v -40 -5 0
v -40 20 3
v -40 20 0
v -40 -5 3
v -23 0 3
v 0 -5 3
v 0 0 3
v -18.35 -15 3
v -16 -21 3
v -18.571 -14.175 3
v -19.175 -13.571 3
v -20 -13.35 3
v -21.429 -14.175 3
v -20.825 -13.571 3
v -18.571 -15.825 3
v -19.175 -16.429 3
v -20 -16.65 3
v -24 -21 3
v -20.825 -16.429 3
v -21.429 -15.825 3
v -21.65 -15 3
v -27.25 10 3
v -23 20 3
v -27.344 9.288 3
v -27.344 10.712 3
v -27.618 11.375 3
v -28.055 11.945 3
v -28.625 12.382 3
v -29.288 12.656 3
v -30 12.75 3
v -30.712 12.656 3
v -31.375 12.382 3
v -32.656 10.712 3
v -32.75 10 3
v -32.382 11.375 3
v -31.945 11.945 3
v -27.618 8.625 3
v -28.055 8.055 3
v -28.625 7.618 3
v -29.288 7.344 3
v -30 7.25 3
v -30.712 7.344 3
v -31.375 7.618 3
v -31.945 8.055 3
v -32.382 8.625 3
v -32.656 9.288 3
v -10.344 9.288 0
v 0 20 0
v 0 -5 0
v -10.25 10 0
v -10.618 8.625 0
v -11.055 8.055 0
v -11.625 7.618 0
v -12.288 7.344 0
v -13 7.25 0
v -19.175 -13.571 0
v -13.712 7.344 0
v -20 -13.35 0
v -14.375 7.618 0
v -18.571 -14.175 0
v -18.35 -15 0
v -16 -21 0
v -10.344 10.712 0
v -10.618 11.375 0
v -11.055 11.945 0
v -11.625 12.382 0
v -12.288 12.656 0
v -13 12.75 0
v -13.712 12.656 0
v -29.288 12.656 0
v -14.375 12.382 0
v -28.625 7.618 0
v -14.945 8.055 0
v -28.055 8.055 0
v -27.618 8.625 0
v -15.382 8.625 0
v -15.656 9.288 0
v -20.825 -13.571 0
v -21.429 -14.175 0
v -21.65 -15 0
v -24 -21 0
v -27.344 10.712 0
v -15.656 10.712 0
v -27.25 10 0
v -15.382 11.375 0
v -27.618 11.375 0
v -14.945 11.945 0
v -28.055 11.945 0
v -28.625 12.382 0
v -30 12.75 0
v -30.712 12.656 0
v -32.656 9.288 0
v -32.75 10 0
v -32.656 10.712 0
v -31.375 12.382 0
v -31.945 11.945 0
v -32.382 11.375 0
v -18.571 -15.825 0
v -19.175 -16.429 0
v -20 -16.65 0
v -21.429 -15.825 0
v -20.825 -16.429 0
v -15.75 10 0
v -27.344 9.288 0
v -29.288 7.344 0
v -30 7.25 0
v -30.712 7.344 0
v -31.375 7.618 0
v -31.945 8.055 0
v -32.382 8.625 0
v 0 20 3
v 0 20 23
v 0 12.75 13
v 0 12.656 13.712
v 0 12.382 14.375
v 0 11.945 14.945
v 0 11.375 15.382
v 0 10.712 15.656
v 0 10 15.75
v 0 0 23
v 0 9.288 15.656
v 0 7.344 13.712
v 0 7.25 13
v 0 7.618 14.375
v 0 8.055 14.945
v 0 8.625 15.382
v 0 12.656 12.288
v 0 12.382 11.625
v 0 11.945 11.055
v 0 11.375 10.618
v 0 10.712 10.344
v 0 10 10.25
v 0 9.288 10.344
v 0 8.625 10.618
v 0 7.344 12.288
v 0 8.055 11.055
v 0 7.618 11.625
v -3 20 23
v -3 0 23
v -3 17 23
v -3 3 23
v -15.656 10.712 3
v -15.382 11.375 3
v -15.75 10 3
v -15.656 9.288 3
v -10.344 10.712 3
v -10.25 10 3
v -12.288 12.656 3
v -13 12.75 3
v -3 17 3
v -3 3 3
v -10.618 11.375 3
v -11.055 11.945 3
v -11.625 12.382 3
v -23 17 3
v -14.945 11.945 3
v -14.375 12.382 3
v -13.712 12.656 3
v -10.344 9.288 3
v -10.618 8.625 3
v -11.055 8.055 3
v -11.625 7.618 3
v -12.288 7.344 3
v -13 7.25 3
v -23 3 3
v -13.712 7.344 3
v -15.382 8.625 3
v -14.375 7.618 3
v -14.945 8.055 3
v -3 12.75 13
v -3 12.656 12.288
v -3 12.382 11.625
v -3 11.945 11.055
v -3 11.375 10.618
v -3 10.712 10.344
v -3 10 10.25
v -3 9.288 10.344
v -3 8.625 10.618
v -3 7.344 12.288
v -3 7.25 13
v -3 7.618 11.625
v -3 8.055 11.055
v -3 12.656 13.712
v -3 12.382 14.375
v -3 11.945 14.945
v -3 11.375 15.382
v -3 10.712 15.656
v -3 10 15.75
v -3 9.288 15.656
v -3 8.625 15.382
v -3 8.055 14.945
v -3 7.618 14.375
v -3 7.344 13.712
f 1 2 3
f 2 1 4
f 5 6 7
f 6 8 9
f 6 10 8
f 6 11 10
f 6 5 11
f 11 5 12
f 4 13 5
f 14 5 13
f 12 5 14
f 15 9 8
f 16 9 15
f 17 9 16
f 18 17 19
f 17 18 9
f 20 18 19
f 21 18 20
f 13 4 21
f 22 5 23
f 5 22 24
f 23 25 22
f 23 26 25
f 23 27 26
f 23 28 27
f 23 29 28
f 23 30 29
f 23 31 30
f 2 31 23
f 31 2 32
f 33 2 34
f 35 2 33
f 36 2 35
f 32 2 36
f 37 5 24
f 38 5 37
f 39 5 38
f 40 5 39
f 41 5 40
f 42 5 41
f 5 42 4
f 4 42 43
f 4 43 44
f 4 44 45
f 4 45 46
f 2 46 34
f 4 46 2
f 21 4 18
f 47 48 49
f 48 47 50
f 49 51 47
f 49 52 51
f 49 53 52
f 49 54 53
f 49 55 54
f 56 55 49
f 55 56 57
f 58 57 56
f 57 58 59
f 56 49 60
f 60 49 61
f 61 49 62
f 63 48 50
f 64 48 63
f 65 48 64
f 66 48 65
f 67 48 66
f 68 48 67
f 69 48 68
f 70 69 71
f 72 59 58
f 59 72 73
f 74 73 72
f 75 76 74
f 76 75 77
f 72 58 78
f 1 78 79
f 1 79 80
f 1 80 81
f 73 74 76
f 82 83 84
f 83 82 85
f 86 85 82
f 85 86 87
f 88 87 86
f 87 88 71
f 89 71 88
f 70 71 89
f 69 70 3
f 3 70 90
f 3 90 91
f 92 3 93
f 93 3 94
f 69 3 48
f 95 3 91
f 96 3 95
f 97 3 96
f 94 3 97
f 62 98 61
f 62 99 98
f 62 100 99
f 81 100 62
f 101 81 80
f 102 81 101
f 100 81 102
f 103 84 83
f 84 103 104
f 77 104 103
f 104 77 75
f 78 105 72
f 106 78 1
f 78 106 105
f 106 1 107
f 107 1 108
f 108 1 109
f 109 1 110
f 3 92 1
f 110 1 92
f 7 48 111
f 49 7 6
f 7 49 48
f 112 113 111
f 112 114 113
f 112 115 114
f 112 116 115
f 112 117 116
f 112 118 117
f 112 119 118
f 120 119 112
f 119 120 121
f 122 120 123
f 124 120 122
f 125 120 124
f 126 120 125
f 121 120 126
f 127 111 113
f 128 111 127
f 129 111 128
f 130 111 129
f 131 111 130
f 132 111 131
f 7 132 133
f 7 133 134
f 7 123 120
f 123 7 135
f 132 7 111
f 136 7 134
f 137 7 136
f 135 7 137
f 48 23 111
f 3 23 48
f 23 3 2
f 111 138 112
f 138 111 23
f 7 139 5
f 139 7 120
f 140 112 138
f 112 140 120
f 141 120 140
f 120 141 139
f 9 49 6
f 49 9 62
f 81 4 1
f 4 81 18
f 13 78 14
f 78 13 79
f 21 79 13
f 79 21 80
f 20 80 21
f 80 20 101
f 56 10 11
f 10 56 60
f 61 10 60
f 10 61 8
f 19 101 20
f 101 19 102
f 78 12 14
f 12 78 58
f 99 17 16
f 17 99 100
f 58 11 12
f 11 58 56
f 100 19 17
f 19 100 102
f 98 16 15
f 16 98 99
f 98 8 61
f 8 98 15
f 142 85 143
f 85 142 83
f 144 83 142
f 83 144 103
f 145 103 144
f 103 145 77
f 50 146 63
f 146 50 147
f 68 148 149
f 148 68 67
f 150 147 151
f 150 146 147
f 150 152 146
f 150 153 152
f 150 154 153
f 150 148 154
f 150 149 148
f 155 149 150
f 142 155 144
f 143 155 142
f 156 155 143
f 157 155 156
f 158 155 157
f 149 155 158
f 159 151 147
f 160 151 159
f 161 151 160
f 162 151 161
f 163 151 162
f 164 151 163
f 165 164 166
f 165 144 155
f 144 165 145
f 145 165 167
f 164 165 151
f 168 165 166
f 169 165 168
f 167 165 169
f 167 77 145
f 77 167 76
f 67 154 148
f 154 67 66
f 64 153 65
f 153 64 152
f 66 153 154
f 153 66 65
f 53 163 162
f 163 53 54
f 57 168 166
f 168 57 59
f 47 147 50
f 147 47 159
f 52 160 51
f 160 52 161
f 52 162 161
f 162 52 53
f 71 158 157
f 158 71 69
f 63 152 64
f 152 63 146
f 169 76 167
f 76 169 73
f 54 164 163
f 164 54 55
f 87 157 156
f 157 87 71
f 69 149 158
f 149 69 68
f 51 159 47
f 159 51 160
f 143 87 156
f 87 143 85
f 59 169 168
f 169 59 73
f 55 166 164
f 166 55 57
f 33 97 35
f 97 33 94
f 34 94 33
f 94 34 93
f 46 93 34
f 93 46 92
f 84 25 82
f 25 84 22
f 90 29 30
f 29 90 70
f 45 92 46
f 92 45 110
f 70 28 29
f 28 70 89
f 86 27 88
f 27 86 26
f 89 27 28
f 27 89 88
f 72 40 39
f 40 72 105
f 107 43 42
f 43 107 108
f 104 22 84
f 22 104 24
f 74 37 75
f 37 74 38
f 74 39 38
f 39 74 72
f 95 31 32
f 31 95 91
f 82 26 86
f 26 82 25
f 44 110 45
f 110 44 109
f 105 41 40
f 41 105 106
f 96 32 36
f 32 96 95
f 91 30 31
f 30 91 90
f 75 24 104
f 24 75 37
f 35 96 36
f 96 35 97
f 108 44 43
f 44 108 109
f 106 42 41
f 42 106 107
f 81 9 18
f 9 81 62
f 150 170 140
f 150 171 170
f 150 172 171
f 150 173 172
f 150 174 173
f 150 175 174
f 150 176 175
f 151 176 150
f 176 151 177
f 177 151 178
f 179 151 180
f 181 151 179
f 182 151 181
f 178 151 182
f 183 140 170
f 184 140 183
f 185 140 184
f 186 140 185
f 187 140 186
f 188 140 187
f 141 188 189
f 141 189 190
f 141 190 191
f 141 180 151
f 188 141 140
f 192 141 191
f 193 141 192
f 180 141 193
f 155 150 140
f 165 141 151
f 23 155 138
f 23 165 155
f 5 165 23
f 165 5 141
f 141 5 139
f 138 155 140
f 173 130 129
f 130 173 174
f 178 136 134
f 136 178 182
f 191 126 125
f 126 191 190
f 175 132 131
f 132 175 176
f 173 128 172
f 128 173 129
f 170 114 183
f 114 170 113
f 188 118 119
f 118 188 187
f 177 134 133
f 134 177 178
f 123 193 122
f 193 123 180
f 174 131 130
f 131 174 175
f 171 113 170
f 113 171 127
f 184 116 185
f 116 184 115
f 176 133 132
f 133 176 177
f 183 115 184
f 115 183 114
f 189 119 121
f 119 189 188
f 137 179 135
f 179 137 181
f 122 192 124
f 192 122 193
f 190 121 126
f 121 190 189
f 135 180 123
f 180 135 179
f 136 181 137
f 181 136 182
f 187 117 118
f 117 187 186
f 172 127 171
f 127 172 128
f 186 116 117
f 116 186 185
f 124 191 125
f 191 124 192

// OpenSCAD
mirror([1,0,0])
difference()
{
    union()
    {
        cube([40,20,3]);
        
        cube([23,20,23]);
        
        translate([20,-20-5,0])
            rotate([0,0,45])
                cube([40,40,3]);
    }
    union()
    {
        translate([20,-20+5,0])
            cylinder(d=3.3,h=3,$fn=12);
        
        translate([10+3,10,0])
            cylinder(d=5.5,h=3,$fn=24);
        translate([30,10,0])
            cylinder(d=5.5,h=3,$fn=24);
        
        translate([0,-20-5,0])
            cube([40,4,3]);
        
        translate([0,20,0])
            cube([40,20,3]);
        
        translate([-20,-10,0])
            cube([20,30,3]);
        translate([40,-10,0])
            cube([20,30,3]);
        
        translate([3,3,3])
            cube([20,20-3*2,20]);
            
        translate([3,0,23])
            rotate([0,45,0])
                cube([20*sqrt(2),20,20*sqrt(2)]);
                
        translate([0,10,3+20/2])
            rotate([0,90,0])
                cylinder(d=5.5,h=3+1,$fn=24);
        
    }
}
